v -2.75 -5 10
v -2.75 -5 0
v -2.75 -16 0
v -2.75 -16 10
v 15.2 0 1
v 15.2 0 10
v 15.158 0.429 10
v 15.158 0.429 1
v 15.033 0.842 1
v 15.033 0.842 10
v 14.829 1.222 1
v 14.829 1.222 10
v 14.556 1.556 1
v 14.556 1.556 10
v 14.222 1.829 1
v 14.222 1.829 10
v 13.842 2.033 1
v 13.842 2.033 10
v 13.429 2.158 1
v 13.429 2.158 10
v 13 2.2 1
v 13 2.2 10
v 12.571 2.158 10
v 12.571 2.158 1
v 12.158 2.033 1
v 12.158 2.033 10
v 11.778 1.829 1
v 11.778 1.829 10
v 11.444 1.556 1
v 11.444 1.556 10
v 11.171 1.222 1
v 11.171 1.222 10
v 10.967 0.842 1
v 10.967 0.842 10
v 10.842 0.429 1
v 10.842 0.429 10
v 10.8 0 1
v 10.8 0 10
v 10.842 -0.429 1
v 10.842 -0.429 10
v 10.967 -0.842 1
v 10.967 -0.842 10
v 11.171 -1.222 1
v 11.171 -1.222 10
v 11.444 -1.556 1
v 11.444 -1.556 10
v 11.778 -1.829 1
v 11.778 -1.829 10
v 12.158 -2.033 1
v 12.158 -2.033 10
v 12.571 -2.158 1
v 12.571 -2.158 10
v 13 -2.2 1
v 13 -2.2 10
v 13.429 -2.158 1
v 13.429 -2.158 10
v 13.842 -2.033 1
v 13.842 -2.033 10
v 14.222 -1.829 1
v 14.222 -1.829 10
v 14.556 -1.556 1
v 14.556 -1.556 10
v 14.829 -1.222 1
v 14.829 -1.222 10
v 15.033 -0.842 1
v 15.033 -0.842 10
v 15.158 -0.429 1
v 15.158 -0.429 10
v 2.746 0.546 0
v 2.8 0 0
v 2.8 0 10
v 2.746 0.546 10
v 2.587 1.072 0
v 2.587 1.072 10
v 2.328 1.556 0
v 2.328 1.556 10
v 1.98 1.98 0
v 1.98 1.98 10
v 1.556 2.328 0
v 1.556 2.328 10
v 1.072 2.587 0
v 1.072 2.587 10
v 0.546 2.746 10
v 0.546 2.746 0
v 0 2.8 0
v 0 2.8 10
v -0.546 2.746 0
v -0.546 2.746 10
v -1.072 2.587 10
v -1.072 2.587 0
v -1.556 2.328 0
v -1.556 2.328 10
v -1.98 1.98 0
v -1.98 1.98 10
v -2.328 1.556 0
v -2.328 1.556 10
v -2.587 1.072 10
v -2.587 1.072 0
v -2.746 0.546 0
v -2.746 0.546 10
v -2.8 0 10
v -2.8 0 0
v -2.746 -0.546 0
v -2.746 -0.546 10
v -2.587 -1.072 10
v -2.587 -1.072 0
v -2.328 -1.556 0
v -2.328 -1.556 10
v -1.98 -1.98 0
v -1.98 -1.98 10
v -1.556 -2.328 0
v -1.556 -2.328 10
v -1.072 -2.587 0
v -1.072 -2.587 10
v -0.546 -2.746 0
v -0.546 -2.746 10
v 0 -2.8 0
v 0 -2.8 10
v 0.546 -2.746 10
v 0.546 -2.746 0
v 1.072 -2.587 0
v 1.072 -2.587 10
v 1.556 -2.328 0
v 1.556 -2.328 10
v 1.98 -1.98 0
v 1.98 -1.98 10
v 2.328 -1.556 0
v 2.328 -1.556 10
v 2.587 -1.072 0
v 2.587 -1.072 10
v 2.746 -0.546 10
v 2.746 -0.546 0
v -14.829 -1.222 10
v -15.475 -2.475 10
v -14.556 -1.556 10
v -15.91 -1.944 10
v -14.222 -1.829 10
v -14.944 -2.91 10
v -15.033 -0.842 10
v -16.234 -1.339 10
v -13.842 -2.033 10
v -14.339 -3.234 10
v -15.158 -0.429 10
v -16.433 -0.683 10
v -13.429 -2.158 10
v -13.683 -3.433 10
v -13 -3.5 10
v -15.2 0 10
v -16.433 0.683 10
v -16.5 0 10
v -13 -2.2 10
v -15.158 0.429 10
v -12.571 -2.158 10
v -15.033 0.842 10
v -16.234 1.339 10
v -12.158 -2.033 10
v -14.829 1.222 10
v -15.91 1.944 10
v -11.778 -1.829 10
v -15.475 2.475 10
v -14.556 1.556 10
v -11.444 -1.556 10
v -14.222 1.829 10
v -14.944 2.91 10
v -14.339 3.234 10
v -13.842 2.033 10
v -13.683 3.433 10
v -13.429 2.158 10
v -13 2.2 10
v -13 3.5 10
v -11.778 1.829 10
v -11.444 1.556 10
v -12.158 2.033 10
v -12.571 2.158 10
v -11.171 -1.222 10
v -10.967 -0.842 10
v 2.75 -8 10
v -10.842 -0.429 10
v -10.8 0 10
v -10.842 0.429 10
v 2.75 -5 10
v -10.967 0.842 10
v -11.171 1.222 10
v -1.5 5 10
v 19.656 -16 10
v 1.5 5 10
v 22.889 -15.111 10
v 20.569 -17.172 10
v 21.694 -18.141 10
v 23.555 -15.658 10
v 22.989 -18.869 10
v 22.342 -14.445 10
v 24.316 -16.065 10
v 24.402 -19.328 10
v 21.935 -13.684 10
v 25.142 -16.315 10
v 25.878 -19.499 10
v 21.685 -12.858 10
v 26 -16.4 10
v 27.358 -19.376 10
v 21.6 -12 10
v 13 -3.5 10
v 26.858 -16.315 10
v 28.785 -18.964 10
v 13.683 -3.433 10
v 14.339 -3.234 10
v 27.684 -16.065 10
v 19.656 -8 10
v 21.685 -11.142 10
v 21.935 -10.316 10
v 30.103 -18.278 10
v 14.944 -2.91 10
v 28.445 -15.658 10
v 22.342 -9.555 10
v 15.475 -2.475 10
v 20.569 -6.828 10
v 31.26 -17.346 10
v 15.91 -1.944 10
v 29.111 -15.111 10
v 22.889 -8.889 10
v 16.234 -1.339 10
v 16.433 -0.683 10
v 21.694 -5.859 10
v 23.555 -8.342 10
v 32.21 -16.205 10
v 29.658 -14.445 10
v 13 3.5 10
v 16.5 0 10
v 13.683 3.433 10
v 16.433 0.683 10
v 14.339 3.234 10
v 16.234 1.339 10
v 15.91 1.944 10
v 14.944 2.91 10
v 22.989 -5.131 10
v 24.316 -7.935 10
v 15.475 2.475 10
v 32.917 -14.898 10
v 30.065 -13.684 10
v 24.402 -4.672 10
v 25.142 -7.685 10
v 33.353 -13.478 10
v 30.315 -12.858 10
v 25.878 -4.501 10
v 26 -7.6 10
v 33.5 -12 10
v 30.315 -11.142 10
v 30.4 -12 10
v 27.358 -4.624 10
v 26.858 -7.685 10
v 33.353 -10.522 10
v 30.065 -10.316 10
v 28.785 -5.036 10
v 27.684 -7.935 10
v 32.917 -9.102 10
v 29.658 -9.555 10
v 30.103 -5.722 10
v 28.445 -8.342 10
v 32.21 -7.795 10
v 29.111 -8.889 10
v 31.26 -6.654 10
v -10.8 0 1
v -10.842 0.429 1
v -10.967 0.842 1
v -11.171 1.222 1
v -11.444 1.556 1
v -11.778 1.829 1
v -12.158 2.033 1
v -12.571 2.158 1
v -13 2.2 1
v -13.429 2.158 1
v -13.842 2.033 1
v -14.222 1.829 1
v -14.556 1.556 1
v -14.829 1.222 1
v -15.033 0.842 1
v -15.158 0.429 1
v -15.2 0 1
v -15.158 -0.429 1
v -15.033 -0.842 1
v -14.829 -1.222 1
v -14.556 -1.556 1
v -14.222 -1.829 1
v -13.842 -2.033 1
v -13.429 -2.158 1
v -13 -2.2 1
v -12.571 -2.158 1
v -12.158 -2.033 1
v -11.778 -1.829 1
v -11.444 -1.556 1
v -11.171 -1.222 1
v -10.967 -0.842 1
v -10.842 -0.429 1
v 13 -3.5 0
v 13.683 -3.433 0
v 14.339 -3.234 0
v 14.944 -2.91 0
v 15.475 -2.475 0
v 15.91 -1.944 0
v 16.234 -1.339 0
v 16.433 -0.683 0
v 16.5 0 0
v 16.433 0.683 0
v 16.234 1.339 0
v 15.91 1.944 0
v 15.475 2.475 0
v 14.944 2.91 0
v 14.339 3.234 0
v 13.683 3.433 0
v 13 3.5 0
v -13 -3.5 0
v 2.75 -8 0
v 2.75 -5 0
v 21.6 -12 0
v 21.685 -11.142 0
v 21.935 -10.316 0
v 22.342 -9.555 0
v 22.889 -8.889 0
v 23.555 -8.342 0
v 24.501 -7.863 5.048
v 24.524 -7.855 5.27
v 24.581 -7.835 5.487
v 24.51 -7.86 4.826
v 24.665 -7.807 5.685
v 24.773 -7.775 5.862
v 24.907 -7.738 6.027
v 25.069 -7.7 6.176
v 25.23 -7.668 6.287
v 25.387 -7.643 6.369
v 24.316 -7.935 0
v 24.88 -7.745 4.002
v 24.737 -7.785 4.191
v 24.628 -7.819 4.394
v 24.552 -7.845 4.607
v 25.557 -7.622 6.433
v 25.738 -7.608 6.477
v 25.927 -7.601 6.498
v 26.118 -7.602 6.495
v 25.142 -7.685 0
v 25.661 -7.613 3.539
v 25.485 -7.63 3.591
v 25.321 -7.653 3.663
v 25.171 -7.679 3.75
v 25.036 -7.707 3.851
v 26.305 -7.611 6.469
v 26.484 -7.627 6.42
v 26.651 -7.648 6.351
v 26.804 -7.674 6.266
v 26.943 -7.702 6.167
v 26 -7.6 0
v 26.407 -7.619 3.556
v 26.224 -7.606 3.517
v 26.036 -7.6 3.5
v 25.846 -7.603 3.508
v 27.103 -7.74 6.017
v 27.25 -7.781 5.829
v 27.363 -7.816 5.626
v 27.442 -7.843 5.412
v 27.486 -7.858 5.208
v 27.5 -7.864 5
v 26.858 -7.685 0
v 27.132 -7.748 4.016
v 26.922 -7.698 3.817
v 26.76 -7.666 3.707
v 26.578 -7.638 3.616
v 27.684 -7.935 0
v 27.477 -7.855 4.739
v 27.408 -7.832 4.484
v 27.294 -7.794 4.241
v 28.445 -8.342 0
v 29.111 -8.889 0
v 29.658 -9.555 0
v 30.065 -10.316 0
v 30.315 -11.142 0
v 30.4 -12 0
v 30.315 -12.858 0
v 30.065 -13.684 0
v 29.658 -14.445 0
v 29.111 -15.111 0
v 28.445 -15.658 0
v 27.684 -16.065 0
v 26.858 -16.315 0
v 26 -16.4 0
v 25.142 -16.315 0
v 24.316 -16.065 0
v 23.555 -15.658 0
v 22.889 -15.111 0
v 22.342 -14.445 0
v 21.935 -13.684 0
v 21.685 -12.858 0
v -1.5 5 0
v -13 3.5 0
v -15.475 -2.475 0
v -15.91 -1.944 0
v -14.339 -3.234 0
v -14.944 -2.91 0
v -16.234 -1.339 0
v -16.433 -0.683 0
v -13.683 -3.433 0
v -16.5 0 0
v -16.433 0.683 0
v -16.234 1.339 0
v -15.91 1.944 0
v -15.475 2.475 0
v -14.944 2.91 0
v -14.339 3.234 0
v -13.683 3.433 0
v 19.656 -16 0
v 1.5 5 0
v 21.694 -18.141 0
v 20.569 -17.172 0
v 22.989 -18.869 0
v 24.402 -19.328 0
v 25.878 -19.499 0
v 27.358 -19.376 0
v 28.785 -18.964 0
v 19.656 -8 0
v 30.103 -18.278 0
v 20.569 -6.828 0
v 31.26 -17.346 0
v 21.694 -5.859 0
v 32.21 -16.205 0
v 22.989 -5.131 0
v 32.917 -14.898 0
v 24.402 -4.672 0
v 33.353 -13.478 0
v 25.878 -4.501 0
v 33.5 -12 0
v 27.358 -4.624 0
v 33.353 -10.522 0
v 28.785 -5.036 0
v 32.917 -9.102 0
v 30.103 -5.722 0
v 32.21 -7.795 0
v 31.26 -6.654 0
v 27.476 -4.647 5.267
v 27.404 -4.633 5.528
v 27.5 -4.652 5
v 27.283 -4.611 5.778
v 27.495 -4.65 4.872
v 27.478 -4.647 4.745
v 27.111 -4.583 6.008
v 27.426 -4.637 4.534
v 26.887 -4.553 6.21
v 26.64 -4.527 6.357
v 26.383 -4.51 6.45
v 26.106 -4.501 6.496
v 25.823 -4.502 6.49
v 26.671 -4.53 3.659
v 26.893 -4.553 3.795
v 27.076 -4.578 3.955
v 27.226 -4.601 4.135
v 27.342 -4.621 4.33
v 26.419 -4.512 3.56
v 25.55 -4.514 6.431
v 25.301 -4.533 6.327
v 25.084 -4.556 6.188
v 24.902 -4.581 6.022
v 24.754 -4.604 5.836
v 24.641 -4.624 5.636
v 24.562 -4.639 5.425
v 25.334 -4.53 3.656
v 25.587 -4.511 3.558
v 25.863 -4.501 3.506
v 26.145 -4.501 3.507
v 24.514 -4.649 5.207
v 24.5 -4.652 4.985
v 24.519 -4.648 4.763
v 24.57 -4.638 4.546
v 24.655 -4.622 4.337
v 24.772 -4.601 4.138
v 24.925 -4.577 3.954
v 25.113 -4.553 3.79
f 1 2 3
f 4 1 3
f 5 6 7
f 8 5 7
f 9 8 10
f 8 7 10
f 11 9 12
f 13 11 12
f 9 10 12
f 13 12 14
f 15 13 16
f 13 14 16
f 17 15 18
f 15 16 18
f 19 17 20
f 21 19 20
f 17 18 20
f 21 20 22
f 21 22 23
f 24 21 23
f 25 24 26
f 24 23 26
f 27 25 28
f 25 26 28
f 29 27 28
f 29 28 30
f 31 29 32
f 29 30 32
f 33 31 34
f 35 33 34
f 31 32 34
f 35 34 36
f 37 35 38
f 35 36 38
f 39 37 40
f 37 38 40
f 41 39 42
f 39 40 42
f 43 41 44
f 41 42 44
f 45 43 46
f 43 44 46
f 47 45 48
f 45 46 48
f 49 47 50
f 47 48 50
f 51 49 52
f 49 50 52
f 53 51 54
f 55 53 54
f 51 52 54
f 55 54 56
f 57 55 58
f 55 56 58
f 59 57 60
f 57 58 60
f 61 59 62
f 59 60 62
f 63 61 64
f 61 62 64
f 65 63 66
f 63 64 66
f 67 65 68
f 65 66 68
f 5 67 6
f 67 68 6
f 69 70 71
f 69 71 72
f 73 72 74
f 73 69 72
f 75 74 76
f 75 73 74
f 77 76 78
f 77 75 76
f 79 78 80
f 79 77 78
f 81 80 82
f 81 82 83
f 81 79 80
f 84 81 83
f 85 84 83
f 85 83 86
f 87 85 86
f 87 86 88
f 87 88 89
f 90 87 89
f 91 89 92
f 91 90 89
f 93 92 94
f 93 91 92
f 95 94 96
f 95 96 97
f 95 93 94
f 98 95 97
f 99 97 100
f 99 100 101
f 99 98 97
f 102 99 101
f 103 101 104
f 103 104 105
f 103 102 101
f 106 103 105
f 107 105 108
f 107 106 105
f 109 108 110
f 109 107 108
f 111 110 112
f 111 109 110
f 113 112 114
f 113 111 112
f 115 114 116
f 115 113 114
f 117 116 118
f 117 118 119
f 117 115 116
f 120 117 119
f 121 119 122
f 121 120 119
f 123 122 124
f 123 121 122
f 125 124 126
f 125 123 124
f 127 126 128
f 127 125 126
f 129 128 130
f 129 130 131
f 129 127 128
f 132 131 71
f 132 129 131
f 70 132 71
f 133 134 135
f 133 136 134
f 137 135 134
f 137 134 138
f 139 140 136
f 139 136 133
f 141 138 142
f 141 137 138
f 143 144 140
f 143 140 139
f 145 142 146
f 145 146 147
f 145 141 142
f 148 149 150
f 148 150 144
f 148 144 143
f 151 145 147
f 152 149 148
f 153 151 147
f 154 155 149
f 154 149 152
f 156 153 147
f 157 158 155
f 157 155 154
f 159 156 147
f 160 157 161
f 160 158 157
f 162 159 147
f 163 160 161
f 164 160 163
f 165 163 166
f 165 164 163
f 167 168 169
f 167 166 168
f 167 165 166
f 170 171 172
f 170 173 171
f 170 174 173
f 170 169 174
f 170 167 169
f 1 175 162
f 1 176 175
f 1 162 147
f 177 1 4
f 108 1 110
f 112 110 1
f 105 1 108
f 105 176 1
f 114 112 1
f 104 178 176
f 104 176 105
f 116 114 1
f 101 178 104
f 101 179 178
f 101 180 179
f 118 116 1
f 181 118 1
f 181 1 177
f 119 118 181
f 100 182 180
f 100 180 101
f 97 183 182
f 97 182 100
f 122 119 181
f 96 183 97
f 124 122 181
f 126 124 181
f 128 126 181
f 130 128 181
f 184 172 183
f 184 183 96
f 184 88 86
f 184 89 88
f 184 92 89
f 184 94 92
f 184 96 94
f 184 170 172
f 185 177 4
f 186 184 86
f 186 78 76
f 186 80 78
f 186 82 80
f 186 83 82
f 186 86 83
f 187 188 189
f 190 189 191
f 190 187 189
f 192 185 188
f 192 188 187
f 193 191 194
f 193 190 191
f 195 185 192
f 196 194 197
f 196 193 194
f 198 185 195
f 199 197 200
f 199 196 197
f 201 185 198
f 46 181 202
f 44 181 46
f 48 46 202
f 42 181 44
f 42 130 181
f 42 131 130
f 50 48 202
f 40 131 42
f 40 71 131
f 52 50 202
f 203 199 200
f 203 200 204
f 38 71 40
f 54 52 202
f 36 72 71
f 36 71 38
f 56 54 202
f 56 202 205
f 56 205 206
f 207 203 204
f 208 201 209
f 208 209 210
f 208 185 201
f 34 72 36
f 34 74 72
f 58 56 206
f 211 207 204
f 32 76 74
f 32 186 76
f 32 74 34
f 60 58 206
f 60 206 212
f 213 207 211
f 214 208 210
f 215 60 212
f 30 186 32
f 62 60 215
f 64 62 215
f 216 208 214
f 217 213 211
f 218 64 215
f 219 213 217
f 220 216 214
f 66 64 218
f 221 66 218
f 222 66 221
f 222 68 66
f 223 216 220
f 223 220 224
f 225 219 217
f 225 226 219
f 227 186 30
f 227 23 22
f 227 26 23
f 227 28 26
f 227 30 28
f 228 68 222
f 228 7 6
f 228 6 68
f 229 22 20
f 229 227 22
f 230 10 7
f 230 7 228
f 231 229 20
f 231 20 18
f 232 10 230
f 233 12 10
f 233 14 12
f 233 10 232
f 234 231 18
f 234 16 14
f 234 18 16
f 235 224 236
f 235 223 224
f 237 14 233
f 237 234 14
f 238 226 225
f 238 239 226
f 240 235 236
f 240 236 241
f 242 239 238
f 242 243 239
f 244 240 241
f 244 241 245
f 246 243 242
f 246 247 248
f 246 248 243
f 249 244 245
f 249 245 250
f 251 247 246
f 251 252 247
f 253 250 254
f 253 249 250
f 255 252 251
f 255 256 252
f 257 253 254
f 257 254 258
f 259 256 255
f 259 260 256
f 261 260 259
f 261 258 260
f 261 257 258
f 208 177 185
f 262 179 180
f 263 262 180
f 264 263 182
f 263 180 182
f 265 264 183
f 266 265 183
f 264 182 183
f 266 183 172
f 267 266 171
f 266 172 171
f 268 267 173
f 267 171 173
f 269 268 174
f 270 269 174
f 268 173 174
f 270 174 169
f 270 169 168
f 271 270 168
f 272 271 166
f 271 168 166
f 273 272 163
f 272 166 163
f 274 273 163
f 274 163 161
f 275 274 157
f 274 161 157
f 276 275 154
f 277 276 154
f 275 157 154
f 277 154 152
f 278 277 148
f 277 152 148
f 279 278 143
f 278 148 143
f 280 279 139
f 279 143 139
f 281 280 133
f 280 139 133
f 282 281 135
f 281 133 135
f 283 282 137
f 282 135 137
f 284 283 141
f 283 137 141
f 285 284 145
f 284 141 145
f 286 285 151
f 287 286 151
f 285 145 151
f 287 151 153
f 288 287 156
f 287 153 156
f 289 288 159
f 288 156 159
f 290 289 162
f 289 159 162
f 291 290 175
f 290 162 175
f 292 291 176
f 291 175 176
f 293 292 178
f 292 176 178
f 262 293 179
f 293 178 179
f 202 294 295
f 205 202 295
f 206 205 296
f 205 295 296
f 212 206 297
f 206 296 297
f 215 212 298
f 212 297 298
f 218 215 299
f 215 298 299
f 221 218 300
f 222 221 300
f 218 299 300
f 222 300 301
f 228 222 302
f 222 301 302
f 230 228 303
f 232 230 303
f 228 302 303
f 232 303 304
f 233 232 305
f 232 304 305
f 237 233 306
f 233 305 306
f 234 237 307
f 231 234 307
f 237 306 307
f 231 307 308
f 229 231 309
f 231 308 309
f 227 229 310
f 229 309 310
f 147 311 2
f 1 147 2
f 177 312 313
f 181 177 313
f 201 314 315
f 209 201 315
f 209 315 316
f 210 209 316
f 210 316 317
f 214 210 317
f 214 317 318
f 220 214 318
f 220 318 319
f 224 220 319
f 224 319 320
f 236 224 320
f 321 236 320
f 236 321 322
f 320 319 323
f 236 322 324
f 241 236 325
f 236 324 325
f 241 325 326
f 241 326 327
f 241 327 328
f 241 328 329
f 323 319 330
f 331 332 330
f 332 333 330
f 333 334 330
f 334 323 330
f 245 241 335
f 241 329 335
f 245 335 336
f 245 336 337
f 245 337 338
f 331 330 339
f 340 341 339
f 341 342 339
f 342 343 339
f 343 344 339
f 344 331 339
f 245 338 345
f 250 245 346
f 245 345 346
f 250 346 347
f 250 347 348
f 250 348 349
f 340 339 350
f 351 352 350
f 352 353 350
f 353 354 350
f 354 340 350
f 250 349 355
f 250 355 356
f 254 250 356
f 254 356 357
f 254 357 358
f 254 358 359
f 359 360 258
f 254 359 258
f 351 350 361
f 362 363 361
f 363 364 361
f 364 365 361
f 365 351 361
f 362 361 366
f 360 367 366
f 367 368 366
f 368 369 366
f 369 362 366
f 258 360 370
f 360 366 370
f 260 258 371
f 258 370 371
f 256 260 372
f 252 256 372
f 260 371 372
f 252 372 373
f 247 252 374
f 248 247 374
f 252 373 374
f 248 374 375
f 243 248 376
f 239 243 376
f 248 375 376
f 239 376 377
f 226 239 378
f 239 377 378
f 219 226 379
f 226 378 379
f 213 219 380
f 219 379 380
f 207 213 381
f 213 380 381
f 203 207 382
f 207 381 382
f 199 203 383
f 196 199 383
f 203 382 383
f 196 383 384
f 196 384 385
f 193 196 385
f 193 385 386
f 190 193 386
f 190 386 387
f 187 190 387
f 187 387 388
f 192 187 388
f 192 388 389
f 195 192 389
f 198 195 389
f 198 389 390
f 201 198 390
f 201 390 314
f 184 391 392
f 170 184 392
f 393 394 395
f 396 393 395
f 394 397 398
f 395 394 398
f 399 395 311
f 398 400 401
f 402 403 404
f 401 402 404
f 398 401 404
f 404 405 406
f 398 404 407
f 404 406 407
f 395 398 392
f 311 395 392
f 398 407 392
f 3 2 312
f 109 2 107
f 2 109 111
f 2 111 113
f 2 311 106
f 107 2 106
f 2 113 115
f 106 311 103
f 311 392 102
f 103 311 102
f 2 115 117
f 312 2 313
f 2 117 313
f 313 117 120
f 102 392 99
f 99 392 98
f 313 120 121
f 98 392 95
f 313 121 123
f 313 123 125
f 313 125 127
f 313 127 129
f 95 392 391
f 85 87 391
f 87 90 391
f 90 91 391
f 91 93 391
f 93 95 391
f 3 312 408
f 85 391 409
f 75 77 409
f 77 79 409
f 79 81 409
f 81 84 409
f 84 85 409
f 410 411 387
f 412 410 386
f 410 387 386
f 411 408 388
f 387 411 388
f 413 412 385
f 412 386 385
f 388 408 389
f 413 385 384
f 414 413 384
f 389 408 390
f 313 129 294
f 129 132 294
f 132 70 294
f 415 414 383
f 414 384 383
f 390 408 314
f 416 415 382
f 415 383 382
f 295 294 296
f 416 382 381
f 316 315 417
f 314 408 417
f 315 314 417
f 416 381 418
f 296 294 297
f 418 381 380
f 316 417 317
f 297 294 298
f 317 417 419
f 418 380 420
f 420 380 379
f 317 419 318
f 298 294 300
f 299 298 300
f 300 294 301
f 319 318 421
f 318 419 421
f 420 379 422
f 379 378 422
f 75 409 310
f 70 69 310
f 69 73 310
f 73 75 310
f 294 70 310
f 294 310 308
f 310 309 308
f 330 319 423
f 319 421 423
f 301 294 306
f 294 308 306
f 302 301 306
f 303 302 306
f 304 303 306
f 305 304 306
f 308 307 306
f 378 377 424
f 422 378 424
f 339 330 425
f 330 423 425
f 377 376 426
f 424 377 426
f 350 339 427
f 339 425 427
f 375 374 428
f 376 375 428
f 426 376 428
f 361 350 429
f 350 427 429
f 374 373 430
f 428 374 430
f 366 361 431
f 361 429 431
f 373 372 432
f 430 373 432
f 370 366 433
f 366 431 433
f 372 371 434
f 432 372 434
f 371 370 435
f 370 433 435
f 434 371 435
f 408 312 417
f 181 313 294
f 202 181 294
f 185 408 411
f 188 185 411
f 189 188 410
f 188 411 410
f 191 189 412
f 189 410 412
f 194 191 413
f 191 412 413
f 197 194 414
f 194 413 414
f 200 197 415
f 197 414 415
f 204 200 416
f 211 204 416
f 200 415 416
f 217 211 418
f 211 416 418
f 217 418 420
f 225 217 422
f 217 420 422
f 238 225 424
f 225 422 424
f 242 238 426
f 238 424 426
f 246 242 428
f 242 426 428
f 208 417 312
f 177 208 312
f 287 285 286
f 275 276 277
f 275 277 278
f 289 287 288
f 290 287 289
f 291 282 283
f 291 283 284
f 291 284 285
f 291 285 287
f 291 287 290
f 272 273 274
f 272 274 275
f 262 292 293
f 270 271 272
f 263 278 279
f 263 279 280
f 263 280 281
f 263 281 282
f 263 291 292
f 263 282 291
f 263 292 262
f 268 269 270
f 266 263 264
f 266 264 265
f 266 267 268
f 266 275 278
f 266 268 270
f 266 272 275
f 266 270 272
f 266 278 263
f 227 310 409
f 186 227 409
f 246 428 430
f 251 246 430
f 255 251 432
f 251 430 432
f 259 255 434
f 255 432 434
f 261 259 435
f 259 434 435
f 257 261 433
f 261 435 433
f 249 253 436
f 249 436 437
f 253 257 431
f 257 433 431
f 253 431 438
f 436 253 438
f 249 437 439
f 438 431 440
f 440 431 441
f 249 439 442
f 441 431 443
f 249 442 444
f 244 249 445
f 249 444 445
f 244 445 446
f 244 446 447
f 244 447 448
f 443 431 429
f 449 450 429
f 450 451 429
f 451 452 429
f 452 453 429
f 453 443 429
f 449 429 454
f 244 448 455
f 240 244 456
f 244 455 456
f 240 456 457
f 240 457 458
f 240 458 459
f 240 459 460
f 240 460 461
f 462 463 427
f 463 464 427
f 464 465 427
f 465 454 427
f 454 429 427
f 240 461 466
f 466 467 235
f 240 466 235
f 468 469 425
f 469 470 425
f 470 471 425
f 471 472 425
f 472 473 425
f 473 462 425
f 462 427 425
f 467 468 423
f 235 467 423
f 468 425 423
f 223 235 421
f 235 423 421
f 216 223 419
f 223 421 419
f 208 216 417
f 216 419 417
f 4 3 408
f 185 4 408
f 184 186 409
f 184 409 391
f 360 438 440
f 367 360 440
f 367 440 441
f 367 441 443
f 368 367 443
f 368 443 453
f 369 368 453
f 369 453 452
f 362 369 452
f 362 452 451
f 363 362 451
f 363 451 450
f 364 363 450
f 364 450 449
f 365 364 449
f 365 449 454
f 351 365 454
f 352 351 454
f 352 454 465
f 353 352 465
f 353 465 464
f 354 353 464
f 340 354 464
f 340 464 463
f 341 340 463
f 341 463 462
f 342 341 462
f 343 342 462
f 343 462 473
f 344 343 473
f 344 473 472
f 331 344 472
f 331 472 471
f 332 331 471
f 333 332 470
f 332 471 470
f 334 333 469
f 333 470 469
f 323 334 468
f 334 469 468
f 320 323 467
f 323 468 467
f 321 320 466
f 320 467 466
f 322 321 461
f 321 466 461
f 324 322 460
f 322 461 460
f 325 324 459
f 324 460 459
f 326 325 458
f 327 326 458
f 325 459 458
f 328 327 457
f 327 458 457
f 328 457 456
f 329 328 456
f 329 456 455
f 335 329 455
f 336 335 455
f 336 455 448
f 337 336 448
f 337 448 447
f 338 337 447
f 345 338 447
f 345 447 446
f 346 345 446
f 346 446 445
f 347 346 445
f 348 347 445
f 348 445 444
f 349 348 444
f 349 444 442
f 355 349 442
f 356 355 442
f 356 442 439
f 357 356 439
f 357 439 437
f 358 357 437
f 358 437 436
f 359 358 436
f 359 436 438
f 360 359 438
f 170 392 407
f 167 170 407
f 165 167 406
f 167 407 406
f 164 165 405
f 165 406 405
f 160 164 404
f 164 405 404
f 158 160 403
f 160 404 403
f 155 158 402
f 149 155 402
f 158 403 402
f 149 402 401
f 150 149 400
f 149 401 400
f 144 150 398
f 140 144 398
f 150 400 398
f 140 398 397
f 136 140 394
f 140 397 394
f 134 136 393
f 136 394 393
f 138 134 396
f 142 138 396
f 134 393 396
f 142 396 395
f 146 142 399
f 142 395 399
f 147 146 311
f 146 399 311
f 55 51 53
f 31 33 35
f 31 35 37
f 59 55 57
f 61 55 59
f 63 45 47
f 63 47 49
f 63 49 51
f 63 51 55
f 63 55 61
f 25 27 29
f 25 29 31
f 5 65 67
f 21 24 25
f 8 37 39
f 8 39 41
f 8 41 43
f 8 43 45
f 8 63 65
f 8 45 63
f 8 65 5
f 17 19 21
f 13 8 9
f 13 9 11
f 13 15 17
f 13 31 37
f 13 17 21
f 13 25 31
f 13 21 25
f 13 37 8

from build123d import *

# Parameters (mm, degrees)
ESQUISSE1_R             = 2.8
ESQUISSE1_W             = 2.75
ESQUISSE1_H             = 8
BOSS_EXTRU_1_DEPTH      = 10
ENL_V_MAT_EXTRU_1_REACH = 17
ESQUISSE2_R             = 1.5
ESQUISSE4_R             = 2.2
ENL_V_MAT_EXTRU_2_DEPTH = 9


with BuildPart() as part:
    # Esquisse1 → Boss.-Extru.1 (new body)
    with BuildSketch(Plane.XY):
        with BuildLine():
            Line((1.5, 5), (-1.5, 5))
            Line((-1.5, 5), (-13, 3.5))
            ThreePointArc((-13, 3.5), (-16.5, 0), (-13, -3.5))
            Line((-13, -3.5), (-2.75, -5))
            Line((-2.75, -5), (2.75, -5))
            Line((2.75, -5), (13, -3.5))
            ThreePointArc((13, -3.5), (16.5, 0), (13, 3.5))
            Line((13, 3.5), (1.5, 5))
        make_face()
        Circle(ESQUISSE1_R, mode=Mode.SUBTRACT)
        Polygon((2.75, -5), (-2.75, -5), (-2.75, -16), (0, -16), (0, -8), (2.75, -8), align=None)
        with Locations((1.375, -12)):
            Rectangle(ESQUISSE1_W, ESQUISSE1_H)
        with BuildLine():
            Line((19.65571123, -8), (2.75, -8))
            Line((2.75, -8), (2.75, -16))
            Line((2.75, -16), (19.65571123, -16))
            ThreePointArc((19.65571123, -16), (18.5, -12), (19.65571123, -8))
        make_face()
        with BuildLine():
            ThreePointArc((33.5, -12), (28.081806214, -4.794718403), (19.65571123, -8))
            Line((19.65571123, -8), (21.6, -8))
            Line((21.6, -8), (21.6, -12))
            Line((21.6, -12), (21.6, -16))
            Line((21.6, -16), (19.65571123, -16))
            ThreePointArc((19.65571123, -16), (28.081806214, -19.205281597), (33.5, -12))
        make_face()
        with BuildLine():
            ThreePointArc((30.4, -12), (26, -16.4), (21.6, -12))
            ThreePointArc((21.6, -12), (26, -7.6), (30.4, -12))
        make_face(mode=Mode.SUBTRACT)
        with BuildLine():
            Line((21.6, -8), (19.65571123, -8))
            ThreePointArc((19.65571123, -8), (18.5, -12), (19.65571123, -16))
            Line((19.65571123, -16), (21.6, -16))
            Line((21.6, -16), (21.6, -12))
            Line((21.6, -12), (21.6, -8))
        make_face()
    extrude(amount=BOSS_EXTRU_1_DEPTH)

    # Esquisse2 → Enlèv. mat.-Extru.1 (cut, up to next)
    with BuildSketch(Plane(origin=(0, -4.5, 0), x_dir=(1, 0, 0), z_dir=(0, 1, 0)), mode=Mode.PRIVATE) as enl_v_mat_extru_1_sk1:
        with Locations((26, -5)):
            Circle(ESQUISSE2_R)
    enl_v_mat_extru_1_tool1 = extrude(enl_v_mat_extru_1_sk1.sketch, amount=-ENL_V_MAT_EXTRU_1_REACH, mode=Mode.PRIVATE) & part.part
    add(enl_v_mat_extru_1_tool1.solids().sort_by_distance((26, -4.5, 5))[0], mode=Mode.SUBTRACT)

    # Esquisse4 → Enlèv. mat.-Extru.2 (cut)
    with BuildSketch(Plane.XY.offset(10)):
        with Locations((-13, 0)):
            Circle(ESQUISSE4_R)
        with Locations((13, 0)):
            Circle(ESQUISSE4_R)
    extrude(amount=-ENL_V_MAT_EXTRU_2_DEPTH, mode=Mode.SUBTRACT)


solid = part.part
